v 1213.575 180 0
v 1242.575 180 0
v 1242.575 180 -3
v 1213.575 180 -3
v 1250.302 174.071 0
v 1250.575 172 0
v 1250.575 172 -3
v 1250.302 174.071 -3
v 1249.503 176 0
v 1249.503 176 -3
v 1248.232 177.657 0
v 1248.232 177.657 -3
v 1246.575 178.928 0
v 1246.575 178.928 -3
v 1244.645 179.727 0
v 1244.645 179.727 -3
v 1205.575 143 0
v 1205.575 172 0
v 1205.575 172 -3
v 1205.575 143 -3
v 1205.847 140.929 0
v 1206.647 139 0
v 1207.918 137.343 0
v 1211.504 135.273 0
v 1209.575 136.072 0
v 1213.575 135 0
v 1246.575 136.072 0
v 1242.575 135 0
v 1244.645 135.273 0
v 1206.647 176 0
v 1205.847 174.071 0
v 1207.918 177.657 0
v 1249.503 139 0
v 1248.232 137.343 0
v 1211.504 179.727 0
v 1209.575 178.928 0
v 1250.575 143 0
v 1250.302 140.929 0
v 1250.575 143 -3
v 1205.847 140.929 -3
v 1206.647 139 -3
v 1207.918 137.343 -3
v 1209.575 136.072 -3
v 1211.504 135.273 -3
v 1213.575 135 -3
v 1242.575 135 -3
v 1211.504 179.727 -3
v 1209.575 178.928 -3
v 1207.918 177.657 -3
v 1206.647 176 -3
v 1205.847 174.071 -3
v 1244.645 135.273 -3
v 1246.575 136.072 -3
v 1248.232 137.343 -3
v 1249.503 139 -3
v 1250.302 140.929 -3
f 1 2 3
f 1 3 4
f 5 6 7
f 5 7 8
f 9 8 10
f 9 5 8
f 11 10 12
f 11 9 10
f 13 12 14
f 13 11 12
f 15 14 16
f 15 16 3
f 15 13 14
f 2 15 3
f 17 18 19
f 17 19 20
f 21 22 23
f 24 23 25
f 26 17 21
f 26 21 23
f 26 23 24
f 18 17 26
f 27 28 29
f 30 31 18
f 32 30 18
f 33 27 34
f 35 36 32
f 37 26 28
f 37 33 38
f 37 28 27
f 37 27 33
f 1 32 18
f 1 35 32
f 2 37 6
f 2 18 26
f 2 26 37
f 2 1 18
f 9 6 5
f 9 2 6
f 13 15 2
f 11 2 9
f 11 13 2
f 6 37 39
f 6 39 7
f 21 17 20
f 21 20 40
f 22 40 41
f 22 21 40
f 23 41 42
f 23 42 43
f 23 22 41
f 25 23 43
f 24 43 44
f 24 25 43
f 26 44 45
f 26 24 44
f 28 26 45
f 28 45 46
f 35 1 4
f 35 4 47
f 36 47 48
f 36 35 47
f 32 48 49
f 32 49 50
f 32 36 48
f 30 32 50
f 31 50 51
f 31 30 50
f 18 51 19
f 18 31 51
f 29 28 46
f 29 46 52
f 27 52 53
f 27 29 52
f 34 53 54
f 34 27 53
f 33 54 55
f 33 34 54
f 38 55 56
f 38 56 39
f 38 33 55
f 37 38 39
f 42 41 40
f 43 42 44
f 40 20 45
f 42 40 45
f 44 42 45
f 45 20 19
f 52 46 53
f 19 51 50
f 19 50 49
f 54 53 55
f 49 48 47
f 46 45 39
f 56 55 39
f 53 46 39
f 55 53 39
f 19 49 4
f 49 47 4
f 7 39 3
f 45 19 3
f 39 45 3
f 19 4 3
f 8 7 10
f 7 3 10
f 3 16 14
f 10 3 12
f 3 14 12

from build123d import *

# Parameters (mm, degrees)
BOSS_EXTRUDE1_DEPTH = 3


with BuildPart() as part:
    # Sketch1 → Boss-Extrude1 (new body)
    with BuildSketch(Plane.XY):
        with BuildLine():
            Line((1213.574821367, 135), (1242.574821367, 135))
            ThreePointArc((1242.574821367, 135), (1248.231675617, 137.343145751), (1250.574821367, 143))
            Line((1250.574821367, 143), (1250.574821367, 172))
            ThreePointArc((1250.574821367, 172), (1248.231675617, 177.656854249), (1242.574821367, 180))
            Line((1242.574821367, 180), (1213.574821367, 180))
            ThreePointArc((1213.574821367, 180), (1207.917967118, 177.656854249), (1205.574821367, 172))
            Line((1205.574821367, 172), (1205.574821367, 143))
            ThreePointArc((1205.574821367, 143), (1207.917967118, 137.343145751), (1213.574821367, 135))
        make_face()
    extrude(amount=-BOSS_EXTRUDE1_DEPTH)


solid = part.part
